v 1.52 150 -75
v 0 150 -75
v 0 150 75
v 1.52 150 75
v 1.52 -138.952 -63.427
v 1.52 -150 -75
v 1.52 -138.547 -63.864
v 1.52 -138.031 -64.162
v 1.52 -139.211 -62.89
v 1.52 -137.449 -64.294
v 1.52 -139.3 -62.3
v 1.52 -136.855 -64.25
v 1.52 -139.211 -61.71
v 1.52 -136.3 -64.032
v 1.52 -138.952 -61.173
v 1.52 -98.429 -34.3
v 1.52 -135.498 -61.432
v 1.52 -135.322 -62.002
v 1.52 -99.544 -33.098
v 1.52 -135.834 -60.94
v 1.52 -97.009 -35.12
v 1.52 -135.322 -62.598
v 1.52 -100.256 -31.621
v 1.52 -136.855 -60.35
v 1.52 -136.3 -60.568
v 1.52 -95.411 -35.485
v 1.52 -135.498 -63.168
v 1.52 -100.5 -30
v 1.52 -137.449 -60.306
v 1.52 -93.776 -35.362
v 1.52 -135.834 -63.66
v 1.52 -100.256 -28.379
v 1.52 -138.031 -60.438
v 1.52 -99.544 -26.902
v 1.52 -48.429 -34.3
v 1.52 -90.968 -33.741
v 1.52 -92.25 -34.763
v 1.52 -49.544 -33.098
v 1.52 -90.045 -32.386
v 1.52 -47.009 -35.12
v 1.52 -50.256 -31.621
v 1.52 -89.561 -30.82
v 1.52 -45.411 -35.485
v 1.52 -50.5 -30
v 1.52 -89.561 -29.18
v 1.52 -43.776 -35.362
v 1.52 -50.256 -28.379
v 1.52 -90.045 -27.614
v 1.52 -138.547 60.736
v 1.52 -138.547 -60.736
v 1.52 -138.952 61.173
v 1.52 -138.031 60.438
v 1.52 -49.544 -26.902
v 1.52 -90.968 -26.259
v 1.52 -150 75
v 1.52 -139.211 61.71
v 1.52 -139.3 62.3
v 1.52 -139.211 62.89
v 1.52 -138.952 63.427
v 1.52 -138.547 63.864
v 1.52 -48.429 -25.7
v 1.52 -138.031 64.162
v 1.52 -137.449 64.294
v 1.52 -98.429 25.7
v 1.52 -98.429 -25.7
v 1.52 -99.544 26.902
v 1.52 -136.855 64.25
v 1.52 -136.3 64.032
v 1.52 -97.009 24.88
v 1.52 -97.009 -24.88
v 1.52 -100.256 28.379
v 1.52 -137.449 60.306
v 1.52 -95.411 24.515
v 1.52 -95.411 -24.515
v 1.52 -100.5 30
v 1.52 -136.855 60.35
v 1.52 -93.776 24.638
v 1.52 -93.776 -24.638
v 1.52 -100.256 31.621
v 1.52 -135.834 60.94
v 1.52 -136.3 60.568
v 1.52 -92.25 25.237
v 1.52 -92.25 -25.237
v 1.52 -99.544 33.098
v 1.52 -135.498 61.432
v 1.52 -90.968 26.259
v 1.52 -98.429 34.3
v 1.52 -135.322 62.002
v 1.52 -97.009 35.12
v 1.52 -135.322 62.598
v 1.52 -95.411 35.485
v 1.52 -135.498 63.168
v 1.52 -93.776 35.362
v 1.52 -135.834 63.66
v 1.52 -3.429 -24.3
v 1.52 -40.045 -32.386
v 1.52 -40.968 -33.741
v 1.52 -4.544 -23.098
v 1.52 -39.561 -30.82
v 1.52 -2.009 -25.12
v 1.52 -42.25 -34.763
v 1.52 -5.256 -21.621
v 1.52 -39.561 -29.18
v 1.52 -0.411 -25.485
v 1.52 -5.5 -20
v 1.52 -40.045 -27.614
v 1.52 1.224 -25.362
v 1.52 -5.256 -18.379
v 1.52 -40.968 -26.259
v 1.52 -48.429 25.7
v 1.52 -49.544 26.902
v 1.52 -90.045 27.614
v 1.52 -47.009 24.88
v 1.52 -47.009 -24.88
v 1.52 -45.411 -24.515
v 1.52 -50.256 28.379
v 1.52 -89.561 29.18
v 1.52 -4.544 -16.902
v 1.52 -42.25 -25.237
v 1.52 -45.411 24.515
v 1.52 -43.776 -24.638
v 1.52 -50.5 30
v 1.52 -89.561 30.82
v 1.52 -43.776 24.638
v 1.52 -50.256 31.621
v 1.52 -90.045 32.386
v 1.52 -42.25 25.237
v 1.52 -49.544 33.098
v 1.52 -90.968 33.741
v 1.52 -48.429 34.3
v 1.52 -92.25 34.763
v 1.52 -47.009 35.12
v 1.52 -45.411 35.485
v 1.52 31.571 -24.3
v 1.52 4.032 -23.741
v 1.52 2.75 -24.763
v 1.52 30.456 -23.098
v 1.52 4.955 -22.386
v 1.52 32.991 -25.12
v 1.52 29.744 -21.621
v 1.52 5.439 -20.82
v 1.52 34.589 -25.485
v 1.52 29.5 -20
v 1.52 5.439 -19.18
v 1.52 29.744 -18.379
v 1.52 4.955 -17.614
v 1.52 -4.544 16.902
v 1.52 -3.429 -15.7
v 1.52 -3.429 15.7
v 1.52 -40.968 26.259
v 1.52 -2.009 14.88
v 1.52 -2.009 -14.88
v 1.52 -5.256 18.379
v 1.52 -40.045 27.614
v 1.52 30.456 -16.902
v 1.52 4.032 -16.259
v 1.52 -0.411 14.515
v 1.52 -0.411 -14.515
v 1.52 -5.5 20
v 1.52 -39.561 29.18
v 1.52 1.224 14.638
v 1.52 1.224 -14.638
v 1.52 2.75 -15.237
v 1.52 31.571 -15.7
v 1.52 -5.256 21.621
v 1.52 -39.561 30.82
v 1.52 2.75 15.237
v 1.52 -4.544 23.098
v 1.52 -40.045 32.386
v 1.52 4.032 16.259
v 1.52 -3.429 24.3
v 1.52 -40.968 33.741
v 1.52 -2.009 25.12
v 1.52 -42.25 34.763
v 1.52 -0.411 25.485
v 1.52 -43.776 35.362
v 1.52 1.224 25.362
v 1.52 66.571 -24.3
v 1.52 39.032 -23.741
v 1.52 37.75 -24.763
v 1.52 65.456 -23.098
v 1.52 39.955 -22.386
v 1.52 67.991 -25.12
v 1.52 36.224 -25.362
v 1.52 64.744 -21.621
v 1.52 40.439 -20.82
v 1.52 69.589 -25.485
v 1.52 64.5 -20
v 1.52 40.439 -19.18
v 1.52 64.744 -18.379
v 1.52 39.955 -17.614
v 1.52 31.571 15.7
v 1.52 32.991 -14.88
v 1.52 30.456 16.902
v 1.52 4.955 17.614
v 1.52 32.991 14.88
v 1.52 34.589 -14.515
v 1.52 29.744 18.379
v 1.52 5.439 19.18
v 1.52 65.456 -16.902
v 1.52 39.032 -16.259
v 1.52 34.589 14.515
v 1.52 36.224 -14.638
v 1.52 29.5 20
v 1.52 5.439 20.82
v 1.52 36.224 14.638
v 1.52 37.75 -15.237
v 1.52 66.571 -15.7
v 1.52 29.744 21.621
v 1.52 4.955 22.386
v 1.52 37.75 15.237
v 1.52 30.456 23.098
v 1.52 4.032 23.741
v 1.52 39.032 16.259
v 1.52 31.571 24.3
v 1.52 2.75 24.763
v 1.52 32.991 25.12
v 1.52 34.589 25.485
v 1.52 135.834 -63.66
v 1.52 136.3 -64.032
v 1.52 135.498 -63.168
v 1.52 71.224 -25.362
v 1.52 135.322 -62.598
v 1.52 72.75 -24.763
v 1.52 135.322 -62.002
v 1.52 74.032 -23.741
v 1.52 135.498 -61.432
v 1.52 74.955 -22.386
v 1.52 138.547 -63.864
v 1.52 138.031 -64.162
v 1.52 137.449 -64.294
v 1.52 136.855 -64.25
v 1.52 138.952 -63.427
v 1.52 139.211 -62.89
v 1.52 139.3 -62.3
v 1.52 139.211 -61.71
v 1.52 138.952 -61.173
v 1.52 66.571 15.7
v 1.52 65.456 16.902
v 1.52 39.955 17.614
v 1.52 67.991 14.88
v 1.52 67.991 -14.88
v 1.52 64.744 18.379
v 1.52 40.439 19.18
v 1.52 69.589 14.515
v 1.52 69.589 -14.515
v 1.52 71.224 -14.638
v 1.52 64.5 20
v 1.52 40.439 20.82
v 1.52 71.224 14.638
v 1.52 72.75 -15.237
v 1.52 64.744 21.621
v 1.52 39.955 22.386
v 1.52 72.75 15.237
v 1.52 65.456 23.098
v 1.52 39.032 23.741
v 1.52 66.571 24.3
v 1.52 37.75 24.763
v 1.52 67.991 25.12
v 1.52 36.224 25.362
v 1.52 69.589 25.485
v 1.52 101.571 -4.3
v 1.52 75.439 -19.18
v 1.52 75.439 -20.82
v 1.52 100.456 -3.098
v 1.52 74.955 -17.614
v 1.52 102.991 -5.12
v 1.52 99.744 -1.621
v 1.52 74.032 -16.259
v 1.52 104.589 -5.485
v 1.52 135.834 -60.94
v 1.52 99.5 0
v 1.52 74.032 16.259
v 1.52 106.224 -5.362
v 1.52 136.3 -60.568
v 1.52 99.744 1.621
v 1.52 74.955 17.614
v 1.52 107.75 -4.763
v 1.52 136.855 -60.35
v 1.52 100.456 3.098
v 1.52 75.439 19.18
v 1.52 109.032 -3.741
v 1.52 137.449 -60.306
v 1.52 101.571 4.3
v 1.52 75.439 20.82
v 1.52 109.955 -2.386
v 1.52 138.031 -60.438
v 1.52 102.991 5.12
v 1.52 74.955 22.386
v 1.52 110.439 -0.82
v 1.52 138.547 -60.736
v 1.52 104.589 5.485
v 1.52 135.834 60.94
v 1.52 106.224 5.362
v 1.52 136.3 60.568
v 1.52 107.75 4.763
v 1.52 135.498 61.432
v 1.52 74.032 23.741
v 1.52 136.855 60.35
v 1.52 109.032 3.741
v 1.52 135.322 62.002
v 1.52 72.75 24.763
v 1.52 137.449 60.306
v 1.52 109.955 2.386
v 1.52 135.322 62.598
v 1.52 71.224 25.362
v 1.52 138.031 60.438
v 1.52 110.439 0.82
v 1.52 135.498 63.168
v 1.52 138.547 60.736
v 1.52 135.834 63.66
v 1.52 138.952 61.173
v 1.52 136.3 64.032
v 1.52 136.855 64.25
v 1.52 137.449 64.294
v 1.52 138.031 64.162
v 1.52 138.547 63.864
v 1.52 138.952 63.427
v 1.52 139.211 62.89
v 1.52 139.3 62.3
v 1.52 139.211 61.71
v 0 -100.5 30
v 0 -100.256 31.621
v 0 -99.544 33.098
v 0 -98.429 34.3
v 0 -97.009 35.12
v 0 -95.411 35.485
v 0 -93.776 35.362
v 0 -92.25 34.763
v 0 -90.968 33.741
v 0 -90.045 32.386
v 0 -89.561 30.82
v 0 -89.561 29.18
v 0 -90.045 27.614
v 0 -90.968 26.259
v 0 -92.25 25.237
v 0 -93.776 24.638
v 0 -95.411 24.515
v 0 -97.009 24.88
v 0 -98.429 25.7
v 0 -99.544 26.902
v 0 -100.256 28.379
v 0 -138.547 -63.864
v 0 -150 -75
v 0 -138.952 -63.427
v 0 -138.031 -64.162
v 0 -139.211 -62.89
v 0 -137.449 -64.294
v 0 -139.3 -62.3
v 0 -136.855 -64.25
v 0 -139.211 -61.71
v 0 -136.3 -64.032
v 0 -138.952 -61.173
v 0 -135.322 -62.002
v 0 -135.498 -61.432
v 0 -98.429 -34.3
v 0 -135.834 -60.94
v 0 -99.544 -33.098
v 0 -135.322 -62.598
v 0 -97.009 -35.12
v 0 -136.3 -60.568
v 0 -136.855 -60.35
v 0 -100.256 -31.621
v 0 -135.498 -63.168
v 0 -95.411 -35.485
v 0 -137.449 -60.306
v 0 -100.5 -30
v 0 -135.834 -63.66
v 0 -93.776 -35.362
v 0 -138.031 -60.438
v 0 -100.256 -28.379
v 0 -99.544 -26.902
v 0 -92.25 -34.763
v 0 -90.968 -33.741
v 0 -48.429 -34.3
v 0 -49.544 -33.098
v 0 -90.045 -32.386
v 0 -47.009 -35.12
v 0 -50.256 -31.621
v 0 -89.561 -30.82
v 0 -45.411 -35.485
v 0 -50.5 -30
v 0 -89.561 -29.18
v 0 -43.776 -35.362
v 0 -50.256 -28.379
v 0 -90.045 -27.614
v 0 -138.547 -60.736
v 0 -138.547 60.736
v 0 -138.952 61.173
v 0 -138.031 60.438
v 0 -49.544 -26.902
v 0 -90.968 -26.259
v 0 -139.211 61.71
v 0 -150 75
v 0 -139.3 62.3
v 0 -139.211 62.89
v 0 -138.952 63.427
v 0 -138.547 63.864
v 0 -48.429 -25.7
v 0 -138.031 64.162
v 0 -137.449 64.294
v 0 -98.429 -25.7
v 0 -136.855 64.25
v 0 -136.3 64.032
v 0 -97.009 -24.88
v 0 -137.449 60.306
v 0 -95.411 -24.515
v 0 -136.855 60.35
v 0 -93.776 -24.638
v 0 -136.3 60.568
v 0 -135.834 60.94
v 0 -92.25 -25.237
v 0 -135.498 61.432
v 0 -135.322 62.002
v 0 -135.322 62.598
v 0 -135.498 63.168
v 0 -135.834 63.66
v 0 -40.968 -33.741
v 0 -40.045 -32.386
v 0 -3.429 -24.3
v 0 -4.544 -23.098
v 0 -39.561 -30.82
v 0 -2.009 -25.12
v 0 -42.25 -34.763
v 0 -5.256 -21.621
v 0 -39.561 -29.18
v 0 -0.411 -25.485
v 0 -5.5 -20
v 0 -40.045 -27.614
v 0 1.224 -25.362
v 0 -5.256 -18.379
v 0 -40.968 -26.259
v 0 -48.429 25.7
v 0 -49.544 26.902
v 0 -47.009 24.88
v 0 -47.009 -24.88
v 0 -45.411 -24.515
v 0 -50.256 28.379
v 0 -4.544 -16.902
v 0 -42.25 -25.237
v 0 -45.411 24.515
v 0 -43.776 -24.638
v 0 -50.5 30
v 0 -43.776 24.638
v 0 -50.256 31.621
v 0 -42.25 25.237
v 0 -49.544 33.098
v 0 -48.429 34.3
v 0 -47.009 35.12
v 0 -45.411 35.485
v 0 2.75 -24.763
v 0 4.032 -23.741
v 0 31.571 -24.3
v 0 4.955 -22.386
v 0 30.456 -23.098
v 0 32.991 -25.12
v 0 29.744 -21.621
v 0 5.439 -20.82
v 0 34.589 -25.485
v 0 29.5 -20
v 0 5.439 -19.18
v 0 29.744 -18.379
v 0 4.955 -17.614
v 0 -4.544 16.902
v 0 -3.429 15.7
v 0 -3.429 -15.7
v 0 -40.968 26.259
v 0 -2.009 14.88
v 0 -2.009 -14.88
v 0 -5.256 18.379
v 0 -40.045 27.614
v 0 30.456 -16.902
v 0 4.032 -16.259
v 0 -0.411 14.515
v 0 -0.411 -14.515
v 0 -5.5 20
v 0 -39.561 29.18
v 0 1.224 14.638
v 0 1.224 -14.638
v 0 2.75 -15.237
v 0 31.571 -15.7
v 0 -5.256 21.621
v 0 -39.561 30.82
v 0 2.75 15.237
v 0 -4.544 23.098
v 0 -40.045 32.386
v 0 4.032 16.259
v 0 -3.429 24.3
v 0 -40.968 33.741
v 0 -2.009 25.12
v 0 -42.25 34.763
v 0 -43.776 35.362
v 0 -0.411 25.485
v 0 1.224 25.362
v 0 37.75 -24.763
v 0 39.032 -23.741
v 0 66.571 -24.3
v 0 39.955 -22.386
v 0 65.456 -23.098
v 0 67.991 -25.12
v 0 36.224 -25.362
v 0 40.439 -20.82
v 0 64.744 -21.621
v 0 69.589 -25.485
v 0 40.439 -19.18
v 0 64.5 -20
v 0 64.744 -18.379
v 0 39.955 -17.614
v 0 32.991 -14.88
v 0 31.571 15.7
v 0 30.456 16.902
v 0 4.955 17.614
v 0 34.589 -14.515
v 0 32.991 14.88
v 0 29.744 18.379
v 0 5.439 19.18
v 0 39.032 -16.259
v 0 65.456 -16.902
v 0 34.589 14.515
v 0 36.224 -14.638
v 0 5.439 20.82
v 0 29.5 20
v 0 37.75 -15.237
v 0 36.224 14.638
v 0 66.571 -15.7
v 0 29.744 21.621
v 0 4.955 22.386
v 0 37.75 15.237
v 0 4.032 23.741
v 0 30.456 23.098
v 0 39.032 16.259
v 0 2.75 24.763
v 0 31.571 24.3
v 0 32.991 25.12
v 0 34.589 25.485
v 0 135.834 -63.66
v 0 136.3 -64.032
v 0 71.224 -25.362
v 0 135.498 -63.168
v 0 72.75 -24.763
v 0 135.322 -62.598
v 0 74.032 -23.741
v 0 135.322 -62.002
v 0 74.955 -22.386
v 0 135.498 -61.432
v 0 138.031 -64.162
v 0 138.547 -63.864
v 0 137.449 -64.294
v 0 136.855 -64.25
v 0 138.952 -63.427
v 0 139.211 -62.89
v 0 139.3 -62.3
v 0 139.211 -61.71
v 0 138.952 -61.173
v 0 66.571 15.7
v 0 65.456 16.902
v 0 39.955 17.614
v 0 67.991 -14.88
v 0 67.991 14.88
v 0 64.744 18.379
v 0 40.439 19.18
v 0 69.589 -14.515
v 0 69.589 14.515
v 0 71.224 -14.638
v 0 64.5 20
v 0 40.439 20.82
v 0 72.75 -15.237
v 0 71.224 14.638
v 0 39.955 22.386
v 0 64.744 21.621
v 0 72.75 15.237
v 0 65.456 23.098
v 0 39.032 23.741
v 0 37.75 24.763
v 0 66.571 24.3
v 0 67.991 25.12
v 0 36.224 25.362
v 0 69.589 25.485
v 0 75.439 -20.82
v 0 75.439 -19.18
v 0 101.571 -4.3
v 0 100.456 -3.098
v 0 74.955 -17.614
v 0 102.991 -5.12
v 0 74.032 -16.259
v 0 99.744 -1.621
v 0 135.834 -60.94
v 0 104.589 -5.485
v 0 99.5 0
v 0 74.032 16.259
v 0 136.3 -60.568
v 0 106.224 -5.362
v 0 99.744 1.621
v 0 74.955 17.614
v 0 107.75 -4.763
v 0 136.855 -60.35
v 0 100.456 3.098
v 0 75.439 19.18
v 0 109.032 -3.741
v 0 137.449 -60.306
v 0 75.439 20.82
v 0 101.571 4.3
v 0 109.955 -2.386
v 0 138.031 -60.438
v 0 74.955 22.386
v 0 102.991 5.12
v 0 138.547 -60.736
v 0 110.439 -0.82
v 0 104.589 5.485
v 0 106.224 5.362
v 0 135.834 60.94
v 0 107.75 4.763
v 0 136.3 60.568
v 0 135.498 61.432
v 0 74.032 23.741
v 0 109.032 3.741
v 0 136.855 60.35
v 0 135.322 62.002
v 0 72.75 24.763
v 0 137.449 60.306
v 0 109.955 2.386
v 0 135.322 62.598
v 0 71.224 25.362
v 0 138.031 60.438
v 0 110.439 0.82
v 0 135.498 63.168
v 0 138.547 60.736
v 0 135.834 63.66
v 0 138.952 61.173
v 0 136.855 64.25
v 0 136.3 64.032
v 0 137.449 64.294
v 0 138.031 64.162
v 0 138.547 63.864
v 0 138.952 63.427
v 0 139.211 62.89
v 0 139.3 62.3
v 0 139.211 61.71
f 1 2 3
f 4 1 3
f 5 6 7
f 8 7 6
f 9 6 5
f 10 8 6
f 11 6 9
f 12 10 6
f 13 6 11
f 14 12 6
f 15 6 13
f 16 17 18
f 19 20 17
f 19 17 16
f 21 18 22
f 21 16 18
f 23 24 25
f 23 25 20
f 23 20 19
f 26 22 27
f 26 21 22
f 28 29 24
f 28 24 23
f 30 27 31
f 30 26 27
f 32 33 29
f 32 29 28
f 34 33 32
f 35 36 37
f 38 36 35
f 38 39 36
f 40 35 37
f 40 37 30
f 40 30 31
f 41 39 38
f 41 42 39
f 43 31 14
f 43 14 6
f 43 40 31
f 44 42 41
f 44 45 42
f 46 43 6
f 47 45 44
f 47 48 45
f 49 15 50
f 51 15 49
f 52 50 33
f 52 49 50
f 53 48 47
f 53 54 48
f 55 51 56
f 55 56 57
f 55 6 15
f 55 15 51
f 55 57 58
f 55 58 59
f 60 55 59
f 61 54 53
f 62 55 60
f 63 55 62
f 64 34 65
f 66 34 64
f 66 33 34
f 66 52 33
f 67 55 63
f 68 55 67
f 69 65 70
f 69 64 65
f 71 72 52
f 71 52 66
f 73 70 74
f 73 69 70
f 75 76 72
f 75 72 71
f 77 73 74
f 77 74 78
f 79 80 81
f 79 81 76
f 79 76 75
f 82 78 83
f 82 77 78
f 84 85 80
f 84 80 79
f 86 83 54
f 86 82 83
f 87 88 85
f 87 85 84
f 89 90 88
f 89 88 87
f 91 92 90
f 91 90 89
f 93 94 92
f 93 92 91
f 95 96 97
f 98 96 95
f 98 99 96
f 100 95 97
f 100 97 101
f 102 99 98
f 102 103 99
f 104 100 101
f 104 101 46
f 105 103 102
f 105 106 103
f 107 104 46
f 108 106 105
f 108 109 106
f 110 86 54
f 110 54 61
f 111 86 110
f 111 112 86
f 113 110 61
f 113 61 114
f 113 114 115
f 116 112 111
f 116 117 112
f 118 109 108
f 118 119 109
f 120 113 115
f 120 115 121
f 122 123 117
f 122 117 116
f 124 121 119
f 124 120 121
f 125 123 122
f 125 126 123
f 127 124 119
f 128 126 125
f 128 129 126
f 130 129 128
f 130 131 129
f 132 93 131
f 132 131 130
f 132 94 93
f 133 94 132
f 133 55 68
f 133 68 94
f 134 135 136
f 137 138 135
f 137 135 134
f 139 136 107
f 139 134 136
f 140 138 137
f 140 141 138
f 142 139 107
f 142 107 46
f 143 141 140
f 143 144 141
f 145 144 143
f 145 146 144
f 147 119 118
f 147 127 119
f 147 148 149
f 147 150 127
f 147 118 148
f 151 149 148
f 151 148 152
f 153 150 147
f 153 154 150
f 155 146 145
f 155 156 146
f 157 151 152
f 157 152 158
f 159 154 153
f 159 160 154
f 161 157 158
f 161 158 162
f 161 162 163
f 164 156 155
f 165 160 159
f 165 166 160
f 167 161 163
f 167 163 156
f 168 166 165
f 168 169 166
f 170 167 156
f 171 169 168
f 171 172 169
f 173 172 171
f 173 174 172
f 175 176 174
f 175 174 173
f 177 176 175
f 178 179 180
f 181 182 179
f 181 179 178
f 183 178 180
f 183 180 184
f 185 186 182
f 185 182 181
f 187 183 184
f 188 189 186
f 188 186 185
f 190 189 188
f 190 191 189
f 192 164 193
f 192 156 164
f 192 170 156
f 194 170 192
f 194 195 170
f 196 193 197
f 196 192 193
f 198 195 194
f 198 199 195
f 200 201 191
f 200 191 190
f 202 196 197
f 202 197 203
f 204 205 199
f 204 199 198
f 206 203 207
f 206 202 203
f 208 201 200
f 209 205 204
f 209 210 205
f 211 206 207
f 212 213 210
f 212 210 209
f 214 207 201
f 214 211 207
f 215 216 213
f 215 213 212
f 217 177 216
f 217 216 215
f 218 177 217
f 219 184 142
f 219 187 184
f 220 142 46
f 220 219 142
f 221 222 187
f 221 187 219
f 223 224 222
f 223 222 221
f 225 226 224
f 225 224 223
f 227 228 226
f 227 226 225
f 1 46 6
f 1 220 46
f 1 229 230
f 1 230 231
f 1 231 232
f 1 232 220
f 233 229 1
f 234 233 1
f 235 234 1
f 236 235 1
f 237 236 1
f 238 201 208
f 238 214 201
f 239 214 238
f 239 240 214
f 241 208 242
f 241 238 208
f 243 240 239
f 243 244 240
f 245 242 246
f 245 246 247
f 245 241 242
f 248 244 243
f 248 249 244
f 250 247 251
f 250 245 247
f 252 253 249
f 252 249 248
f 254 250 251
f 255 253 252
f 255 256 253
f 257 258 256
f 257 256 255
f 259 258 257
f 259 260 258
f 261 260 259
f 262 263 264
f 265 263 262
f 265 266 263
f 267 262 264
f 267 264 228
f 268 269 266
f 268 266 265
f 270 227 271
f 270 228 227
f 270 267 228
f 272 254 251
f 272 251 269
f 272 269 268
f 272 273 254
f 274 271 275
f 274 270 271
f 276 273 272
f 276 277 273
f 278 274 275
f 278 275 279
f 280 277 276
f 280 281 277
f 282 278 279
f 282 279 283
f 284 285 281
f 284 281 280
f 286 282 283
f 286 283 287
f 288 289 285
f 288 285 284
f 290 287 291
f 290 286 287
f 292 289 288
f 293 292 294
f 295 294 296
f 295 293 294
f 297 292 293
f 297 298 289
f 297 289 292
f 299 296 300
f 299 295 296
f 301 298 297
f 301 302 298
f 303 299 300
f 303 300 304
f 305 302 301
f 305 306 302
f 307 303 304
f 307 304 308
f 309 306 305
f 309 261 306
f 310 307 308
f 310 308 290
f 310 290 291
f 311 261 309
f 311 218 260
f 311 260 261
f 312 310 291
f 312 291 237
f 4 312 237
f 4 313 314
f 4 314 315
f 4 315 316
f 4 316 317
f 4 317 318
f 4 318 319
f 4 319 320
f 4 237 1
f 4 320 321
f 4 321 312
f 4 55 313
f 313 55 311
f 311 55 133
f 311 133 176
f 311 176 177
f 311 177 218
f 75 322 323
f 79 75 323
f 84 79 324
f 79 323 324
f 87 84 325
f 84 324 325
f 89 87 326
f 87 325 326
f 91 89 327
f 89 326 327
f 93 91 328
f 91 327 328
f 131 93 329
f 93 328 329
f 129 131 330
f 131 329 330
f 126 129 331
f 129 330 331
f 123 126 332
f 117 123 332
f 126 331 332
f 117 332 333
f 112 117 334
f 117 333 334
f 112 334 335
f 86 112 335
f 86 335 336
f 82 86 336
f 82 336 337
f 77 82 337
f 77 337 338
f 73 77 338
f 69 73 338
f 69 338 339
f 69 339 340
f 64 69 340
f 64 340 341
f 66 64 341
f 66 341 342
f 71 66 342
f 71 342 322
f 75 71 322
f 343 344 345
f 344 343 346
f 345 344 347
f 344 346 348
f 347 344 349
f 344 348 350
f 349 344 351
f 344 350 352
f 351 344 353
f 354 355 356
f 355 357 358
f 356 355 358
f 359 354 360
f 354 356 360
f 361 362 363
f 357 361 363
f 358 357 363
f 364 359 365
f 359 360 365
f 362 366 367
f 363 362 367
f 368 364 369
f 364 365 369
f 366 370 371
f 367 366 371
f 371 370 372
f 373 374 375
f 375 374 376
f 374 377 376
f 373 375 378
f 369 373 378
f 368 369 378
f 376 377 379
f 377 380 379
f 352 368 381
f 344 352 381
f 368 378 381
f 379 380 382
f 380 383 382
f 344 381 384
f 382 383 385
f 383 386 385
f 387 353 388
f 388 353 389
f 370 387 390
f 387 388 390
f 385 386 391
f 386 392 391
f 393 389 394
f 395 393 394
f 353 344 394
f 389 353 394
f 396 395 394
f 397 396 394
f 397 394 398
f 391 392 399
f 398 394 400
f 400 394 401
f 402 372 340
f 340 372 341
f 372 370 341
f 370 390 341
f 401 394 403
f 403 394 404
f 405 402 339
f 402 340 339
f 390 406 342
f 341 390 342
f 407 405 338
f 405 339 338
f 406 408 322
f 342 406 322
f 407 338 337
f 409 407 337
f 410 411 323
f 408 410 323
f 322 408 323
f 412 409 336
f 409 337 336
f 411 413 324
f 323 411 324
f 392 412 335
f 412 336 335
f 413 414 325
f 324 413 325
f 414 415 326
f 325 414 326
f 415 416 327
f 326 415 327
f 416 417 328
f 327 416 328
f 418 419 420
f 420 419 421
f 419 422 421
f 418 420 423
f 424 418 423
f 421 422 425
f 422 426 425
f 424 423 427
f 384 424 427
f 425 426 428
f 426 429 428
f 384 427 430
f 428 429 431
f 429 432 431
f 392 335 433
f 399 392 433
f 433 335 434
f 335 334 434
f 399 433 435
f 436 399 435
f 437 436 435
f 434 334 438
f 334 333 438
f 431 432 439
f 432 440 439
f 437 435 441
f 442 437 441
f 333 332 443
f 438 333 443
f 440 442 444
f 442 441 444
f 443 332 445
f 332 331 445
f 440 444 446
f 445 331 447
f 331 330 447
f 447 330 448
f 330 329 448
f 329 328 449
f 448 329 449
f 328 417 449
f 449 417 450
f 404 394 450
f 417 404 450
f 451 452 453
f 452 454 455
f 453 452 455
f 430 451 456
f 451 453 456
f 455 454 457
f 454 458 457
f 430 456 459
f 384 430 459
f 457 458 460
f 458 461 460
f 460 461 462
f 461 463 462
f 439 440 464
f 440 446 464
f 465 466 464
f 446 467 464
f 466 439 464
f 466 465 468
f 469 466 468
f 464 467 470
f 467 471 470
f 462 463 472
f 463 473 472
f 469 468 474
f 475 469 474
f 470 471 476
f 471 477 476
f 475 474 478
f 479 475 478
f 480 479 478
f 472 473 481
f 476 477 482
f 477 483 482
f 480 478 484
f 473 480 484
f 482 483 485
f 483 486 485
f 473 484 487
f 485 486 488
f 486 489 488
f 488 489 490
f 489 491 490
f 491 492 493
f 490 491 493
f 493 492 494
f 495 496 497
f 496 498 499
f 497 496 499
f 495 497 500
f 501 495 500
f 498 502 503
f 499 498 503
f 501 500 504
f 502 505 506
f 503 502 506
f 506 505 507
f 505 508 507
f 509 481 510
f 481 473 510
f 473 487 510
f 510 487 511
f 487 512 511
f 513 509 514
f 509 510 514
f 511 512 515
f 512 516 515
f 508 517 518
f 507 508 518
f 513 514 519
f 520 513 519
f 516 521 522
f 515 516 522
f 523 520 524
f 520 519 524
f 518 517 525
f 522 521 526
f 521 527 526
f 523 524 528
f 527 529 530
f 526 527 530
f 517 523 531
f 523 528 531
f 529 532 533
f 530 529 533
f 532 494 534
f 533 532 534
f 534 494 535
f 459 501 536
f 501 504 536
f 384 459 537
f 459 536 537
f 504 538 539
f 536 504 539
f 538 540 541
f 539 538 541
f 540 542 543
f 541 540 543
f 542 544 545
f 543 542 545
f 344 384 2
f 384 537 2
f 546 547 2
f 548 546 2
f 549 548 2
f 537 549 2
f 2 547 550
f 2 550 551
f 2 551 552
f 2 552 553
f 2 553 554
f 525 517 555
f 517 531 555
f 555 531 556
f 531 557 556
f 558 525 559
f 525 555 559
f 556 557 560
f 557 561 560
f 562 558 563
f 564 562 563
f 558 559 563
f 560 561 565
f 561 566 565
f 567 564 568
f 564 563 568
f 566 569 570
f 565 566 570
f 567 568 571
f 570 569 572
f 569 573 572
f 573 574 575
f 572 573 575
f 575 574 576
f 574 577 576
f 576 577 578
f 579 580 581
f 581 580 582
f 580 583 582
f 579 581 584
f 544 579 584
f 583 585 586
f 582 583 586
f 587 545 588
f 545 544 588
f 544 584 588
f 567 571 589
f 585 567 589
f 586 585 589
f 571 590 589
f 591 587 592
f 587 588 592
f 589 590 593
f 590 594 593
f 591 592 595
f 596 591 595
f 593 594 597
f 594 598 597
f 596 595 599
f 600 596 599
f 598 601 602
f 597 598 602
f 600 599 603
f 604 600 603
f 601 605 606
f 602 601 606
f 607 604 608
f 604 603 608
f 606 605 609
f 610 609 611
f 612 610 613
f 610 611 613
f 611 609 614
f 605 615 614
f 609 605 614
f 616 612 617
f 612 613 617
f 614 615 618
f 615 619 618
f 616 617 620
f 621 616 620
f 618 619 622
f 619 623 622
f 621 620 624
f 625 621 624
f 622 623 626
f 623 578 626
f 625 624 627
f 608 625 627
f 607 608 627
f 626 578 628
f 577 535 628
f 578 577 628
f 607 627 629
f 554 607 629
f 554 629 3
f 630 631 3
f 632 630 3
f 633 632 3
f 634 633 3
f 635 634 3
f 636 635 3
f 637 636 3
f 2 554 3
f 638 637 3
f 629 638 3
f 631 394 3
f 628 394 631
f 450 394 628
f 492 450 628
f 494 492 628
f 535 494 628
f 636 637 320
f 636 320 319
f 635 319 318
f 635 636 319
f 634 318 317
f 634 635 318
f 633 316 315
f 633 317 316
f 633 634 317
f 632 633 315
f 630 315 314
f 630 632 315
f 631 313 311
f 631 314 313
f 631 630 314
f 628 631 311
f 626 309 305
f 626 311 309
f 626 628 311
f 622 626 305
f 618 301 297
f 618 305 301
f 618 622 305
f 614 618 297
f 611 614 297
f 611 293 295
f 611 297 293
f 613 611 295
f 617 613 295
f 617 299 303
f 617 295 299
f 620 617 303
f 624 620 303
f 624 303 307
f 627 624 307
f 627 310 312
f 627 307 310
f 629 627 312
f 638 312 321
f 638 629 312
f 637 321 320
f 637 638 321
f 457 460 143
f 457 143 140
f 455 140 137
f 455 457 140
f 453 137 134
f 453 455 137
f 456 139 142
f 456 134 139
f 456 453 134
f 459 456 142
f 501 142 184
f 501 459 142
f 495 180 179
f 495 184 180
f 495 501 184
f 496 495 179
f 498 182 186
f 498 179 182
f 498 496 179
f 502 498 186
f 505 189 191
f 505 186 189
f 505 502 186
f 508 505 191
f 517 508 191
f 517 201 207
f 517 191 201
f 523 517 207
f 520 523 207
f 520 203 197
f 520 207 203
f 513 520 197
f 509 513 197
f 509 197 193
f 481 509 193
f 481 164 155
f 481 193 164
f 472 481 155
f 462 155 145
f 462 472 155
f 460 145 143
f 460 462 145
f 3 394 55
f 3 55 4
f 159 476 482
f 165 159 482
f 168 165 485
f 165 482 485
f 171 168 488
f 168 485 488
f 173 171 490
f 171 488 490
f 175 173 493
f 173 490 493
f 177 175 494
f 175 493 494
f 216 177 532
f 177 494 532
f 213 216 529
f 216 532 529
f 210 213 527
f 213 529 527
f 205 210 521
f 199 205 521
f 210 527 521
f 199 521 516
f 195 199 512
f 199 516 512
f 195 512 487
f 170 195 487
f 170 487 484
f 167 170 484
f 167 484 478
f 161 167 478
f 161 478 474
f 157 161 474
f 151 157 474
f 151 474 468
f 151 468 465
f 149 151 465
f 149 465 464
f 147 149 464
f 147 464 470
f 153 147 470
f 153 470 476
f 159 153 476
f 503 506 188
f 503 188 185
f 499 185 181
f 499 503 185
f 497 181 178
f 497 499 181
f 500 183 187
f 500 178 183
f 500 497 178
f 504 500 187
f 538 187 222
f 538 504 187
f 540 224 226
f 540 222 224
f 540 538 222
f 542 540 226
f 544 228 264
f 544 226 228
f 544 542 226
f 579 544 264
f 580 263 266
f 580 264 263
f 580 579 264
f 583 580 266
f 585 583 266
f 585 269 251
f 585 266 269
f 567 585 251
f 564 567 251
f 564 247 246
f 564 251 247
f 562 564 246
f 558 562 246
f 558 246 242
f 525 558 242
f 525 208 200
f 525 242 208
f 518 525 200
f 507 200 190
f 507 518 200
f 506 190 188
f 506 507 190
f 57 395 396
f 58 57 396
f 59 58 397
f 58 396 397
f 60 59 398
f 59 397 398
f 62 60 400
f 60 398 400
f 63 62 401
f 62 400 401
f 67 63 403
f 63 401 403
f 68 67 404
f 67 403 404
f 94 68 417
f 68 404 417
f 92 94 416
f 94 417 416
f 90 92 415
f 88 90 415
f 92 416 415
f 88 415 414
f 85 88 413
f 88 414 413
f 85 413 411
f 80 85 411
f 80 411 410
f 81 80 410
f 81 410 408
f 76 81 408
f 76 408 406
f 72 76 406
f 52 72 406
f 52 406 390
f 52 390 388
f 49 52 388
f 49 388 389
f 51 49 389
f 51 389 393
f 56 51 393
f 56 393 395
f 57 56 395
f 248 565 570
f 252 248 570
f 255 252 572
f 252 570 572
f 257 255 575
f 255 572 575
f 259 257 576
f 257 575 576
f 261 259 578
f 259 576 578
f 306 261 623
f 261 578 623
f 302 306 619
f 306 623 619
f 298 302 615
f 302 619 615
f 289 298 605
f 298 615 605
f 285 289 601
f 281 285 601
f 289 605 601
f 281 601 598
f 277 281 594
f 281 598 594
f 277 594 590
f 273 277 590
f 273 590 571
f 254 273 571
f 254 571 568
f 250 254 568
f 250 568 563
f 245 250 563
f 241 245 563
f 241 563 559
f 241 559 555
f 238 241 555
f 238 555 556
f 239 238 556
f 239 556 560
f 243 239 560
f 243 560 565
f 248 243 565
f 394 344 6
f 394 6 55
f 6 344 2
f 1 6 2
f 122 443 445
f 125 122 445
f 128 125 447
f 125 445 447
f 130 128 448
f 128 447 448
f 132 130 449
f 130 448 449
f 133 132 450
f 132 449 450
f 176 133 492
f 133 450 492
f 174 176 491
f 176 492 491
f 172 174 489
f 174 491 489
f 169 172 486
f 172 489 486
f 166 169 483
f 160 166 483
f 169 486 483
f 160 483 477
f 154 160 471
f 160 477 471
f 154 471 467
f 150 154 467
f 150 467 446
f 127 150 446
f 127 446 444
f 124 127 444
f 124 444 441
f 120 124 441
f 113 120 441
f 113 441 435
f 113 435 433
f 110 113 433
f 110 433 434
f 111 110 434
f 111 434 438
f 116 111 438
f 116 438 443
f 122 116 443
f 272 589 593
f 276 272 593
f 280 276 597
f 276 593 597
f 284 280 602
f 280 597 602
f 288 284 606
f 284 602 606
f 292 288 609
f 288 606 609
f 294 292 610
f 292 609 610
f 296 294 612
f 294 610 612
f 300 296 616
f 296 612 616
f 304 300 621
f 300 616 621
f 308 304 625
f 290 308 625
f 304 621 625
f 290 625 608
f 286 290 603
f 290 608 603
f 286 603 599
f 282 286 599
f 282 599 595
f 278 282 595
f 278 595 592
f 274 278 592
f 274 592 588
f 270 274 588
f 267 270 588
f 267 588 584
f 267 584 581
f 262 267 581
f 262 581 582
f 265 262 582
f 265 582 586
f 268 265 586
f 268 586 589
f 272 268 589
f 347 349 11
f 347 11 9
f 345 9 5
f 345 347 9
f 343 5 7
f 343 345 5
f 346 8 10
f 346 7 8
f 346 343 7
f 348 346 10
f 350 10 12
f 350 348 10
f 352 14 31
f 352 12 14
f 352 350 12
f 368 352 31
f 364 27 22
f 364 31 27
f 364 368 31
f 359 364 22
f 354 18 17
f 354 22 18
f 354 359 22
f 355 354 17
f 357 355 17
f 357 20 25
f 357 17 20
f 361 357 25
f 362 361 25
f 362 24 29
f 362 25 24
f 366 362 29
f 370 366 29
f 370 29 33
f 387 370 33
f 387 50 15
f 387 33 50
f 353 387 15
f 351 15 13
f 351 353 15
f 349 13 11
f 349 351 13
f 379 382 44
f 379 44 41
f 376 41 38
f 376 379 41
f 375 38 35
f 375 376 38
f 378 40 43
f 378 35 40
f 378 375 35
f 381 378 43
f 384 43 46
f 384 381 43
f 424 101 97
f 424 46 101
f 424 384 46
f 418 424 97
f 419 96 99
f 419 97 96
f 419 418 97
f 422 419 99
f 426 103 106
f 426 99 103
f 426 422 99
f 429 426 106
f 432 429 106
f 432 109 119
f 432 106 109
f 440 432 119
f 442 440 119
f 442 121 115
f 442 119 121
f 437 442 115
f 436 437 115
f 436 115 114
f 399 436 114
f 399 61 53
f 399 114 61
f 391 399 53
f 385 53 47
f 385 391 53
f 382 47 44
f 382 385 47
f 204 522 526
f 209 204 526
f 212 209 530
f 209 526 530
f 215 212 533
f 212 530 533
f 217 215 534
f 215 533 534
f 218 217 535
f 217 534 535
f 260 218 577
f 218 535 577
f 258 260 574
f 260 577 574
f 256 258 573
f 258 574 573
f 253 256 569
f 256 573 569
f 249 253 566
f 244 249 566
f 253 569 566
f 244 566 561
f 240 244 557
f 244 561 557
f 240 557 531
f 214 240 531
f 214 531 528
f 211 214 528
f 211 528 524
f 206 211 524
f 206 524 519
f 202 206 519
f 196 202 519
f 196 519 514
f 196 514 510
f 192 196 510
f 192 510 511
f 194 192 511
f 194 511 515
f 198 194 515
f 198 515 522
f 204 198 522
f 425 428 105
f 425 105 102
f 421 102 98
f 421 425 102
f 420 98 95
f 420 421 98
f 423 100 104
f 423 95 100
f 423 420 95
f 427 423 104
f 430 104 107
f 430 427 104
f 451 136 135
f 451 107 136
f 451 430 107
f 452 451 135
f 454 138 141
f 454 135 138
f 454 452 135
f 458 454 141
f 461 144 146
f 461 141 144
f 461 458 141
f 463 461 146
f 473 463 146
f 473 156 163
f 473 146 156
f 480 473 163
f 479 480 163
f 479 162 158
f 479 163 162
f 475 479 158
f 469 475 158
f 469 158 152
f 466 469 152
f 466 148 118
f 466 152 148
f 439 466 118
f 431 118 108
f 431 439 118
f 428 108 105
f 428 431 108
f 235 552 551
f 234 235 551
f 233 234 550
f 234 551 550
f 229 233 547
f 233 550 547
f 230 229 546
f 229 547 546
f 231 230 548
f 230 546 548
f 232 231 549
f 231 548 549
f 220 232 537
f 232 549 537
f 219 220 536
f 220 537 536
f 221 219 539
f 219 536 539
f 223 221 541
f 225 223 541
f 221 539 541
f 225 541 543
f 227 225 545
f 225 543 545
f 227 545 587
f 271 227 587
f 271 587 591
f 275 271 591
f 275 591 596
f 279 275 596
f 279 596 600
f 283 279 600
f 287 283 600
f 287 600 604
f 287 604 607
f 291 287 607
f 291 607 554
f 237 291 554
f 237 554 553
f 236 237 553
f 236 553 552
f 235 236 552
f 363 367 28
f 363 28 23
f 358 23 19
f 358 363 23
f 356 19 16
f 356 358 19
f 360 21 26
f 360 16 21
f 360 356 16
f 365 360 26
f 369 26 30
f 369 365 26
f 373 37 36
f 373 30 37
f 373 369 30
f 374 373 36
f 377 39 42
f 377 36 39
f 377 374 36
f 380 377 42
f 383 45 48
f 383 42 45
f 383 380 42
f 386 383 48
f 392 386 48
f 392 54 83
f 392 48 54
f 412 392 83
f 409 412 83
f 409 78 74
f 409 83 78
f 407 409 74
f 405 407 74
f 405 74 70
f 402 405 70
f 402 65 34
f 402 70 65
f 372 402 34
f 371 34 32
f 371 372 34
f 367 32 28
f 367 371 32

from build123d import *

# Parameters (mm, degrees)
SKETCH2_W                            = 300
SKETCH2_H                            = 150
BOSS_EXTRUDE1_DEPTH                  = 1.52
F_4_0_4_DIAMETER_HOLE1_D             = 4
MIRROR1_AT_THE_SECOND_PLANE_COPY_1_D = 4
F_11_0_11_DIAMETER_HOLE4_D           = 11
F_11_0_11_DIAMETER_HOLE2_D           = 11
F_11_0_11_DIAMETER_HOLE3_D           = 11


with BuildPart() as part:
    # Sketch2 → Boss-Extrude1 (new body)
    with BuildSketch(Plane.YZ):
        Rectangle(SKETCH2_W, SKETCH2_H)
    extrude(amount=BOSS_EXTRUDE1_DEPTH)

    # Ø4.0 (4) Diameter Hole1 (through all)
    with Locations(Plane.YZ.offset(1.52)):
        with Locations((-137.3, 62.3)):
            f_4_0_4_diameter_hole1 = Hole(F_4_0_4_DIAMETER_HOLE1_D / 2)

    # Mirror1: Ø4.0 (4) Diameter Hole1 across plane
    add(f_4_0_4_diameter_hole1.mirror(Plane.ZX), mode=Mode.SUBTRACT)

    # Mirror1 at the second plane: Ø4.0 (4) Diameter Hole1 across plane
    add(f_4_0_4_diameter_hole1.mirror(Plane.XY), mode=Mode.SUBTRACT)

    # Mirror1 at the second plane copy 1 (through all)
    with Locations(Plane(origin=(1.52, 0, 0), x_dir=(0, -1, 0), z_dir=(1, 0, 0))):
        with Locations((-137.3, 62.3)):
            Hole(MIRROR1_AT_THE_SECOND_PLANE_COPY_1_D / 2)

    # Ø11.0 (11) Diameter Hole4 (through all)
    with Locations(Plane.YZ.offset(1.52)):
        with Locations((-95, 30), (-45, 30)):
            f_11_0_11_diameter_hole4 = Hole(F_11_0_11_DIAMETER_HOLE4_D / 2)

    # Mirror2: Ø11.0 (11) Diameter Hole4 across plane
    add(f_11_0_11_diameter_hole4.mirror(Plane.XY), mode=Mode.SUBTRACT)

    # Ø11.0 (11) Diameter Hole2 (through all)
    with Locations(Plane.YZ.offset(1.52)):
        with Locations((0, 20), (35, 20), (70, 20)):
            f_11_0_11_diameter_hole2 = Hole(F_11_0_11_DIAMETER_HOLE2_D / 2)

    # Mirror3: Ø11.0 (11) Diameter Hole2 across plane
    add(f_11_0_11_diameter_hole2.mirror(Plane.XY), mode=Mode.SUBTRACT)

    # Ø11.0 (11) Diameter Hole3 (through all)
    with Locations(Plane.YZ.offset(1.52)):
        with Locations((105, 0)):
            Hole(F_11_0_11_DIAMETER_HOLE3_D / 2)


solid = part.part
